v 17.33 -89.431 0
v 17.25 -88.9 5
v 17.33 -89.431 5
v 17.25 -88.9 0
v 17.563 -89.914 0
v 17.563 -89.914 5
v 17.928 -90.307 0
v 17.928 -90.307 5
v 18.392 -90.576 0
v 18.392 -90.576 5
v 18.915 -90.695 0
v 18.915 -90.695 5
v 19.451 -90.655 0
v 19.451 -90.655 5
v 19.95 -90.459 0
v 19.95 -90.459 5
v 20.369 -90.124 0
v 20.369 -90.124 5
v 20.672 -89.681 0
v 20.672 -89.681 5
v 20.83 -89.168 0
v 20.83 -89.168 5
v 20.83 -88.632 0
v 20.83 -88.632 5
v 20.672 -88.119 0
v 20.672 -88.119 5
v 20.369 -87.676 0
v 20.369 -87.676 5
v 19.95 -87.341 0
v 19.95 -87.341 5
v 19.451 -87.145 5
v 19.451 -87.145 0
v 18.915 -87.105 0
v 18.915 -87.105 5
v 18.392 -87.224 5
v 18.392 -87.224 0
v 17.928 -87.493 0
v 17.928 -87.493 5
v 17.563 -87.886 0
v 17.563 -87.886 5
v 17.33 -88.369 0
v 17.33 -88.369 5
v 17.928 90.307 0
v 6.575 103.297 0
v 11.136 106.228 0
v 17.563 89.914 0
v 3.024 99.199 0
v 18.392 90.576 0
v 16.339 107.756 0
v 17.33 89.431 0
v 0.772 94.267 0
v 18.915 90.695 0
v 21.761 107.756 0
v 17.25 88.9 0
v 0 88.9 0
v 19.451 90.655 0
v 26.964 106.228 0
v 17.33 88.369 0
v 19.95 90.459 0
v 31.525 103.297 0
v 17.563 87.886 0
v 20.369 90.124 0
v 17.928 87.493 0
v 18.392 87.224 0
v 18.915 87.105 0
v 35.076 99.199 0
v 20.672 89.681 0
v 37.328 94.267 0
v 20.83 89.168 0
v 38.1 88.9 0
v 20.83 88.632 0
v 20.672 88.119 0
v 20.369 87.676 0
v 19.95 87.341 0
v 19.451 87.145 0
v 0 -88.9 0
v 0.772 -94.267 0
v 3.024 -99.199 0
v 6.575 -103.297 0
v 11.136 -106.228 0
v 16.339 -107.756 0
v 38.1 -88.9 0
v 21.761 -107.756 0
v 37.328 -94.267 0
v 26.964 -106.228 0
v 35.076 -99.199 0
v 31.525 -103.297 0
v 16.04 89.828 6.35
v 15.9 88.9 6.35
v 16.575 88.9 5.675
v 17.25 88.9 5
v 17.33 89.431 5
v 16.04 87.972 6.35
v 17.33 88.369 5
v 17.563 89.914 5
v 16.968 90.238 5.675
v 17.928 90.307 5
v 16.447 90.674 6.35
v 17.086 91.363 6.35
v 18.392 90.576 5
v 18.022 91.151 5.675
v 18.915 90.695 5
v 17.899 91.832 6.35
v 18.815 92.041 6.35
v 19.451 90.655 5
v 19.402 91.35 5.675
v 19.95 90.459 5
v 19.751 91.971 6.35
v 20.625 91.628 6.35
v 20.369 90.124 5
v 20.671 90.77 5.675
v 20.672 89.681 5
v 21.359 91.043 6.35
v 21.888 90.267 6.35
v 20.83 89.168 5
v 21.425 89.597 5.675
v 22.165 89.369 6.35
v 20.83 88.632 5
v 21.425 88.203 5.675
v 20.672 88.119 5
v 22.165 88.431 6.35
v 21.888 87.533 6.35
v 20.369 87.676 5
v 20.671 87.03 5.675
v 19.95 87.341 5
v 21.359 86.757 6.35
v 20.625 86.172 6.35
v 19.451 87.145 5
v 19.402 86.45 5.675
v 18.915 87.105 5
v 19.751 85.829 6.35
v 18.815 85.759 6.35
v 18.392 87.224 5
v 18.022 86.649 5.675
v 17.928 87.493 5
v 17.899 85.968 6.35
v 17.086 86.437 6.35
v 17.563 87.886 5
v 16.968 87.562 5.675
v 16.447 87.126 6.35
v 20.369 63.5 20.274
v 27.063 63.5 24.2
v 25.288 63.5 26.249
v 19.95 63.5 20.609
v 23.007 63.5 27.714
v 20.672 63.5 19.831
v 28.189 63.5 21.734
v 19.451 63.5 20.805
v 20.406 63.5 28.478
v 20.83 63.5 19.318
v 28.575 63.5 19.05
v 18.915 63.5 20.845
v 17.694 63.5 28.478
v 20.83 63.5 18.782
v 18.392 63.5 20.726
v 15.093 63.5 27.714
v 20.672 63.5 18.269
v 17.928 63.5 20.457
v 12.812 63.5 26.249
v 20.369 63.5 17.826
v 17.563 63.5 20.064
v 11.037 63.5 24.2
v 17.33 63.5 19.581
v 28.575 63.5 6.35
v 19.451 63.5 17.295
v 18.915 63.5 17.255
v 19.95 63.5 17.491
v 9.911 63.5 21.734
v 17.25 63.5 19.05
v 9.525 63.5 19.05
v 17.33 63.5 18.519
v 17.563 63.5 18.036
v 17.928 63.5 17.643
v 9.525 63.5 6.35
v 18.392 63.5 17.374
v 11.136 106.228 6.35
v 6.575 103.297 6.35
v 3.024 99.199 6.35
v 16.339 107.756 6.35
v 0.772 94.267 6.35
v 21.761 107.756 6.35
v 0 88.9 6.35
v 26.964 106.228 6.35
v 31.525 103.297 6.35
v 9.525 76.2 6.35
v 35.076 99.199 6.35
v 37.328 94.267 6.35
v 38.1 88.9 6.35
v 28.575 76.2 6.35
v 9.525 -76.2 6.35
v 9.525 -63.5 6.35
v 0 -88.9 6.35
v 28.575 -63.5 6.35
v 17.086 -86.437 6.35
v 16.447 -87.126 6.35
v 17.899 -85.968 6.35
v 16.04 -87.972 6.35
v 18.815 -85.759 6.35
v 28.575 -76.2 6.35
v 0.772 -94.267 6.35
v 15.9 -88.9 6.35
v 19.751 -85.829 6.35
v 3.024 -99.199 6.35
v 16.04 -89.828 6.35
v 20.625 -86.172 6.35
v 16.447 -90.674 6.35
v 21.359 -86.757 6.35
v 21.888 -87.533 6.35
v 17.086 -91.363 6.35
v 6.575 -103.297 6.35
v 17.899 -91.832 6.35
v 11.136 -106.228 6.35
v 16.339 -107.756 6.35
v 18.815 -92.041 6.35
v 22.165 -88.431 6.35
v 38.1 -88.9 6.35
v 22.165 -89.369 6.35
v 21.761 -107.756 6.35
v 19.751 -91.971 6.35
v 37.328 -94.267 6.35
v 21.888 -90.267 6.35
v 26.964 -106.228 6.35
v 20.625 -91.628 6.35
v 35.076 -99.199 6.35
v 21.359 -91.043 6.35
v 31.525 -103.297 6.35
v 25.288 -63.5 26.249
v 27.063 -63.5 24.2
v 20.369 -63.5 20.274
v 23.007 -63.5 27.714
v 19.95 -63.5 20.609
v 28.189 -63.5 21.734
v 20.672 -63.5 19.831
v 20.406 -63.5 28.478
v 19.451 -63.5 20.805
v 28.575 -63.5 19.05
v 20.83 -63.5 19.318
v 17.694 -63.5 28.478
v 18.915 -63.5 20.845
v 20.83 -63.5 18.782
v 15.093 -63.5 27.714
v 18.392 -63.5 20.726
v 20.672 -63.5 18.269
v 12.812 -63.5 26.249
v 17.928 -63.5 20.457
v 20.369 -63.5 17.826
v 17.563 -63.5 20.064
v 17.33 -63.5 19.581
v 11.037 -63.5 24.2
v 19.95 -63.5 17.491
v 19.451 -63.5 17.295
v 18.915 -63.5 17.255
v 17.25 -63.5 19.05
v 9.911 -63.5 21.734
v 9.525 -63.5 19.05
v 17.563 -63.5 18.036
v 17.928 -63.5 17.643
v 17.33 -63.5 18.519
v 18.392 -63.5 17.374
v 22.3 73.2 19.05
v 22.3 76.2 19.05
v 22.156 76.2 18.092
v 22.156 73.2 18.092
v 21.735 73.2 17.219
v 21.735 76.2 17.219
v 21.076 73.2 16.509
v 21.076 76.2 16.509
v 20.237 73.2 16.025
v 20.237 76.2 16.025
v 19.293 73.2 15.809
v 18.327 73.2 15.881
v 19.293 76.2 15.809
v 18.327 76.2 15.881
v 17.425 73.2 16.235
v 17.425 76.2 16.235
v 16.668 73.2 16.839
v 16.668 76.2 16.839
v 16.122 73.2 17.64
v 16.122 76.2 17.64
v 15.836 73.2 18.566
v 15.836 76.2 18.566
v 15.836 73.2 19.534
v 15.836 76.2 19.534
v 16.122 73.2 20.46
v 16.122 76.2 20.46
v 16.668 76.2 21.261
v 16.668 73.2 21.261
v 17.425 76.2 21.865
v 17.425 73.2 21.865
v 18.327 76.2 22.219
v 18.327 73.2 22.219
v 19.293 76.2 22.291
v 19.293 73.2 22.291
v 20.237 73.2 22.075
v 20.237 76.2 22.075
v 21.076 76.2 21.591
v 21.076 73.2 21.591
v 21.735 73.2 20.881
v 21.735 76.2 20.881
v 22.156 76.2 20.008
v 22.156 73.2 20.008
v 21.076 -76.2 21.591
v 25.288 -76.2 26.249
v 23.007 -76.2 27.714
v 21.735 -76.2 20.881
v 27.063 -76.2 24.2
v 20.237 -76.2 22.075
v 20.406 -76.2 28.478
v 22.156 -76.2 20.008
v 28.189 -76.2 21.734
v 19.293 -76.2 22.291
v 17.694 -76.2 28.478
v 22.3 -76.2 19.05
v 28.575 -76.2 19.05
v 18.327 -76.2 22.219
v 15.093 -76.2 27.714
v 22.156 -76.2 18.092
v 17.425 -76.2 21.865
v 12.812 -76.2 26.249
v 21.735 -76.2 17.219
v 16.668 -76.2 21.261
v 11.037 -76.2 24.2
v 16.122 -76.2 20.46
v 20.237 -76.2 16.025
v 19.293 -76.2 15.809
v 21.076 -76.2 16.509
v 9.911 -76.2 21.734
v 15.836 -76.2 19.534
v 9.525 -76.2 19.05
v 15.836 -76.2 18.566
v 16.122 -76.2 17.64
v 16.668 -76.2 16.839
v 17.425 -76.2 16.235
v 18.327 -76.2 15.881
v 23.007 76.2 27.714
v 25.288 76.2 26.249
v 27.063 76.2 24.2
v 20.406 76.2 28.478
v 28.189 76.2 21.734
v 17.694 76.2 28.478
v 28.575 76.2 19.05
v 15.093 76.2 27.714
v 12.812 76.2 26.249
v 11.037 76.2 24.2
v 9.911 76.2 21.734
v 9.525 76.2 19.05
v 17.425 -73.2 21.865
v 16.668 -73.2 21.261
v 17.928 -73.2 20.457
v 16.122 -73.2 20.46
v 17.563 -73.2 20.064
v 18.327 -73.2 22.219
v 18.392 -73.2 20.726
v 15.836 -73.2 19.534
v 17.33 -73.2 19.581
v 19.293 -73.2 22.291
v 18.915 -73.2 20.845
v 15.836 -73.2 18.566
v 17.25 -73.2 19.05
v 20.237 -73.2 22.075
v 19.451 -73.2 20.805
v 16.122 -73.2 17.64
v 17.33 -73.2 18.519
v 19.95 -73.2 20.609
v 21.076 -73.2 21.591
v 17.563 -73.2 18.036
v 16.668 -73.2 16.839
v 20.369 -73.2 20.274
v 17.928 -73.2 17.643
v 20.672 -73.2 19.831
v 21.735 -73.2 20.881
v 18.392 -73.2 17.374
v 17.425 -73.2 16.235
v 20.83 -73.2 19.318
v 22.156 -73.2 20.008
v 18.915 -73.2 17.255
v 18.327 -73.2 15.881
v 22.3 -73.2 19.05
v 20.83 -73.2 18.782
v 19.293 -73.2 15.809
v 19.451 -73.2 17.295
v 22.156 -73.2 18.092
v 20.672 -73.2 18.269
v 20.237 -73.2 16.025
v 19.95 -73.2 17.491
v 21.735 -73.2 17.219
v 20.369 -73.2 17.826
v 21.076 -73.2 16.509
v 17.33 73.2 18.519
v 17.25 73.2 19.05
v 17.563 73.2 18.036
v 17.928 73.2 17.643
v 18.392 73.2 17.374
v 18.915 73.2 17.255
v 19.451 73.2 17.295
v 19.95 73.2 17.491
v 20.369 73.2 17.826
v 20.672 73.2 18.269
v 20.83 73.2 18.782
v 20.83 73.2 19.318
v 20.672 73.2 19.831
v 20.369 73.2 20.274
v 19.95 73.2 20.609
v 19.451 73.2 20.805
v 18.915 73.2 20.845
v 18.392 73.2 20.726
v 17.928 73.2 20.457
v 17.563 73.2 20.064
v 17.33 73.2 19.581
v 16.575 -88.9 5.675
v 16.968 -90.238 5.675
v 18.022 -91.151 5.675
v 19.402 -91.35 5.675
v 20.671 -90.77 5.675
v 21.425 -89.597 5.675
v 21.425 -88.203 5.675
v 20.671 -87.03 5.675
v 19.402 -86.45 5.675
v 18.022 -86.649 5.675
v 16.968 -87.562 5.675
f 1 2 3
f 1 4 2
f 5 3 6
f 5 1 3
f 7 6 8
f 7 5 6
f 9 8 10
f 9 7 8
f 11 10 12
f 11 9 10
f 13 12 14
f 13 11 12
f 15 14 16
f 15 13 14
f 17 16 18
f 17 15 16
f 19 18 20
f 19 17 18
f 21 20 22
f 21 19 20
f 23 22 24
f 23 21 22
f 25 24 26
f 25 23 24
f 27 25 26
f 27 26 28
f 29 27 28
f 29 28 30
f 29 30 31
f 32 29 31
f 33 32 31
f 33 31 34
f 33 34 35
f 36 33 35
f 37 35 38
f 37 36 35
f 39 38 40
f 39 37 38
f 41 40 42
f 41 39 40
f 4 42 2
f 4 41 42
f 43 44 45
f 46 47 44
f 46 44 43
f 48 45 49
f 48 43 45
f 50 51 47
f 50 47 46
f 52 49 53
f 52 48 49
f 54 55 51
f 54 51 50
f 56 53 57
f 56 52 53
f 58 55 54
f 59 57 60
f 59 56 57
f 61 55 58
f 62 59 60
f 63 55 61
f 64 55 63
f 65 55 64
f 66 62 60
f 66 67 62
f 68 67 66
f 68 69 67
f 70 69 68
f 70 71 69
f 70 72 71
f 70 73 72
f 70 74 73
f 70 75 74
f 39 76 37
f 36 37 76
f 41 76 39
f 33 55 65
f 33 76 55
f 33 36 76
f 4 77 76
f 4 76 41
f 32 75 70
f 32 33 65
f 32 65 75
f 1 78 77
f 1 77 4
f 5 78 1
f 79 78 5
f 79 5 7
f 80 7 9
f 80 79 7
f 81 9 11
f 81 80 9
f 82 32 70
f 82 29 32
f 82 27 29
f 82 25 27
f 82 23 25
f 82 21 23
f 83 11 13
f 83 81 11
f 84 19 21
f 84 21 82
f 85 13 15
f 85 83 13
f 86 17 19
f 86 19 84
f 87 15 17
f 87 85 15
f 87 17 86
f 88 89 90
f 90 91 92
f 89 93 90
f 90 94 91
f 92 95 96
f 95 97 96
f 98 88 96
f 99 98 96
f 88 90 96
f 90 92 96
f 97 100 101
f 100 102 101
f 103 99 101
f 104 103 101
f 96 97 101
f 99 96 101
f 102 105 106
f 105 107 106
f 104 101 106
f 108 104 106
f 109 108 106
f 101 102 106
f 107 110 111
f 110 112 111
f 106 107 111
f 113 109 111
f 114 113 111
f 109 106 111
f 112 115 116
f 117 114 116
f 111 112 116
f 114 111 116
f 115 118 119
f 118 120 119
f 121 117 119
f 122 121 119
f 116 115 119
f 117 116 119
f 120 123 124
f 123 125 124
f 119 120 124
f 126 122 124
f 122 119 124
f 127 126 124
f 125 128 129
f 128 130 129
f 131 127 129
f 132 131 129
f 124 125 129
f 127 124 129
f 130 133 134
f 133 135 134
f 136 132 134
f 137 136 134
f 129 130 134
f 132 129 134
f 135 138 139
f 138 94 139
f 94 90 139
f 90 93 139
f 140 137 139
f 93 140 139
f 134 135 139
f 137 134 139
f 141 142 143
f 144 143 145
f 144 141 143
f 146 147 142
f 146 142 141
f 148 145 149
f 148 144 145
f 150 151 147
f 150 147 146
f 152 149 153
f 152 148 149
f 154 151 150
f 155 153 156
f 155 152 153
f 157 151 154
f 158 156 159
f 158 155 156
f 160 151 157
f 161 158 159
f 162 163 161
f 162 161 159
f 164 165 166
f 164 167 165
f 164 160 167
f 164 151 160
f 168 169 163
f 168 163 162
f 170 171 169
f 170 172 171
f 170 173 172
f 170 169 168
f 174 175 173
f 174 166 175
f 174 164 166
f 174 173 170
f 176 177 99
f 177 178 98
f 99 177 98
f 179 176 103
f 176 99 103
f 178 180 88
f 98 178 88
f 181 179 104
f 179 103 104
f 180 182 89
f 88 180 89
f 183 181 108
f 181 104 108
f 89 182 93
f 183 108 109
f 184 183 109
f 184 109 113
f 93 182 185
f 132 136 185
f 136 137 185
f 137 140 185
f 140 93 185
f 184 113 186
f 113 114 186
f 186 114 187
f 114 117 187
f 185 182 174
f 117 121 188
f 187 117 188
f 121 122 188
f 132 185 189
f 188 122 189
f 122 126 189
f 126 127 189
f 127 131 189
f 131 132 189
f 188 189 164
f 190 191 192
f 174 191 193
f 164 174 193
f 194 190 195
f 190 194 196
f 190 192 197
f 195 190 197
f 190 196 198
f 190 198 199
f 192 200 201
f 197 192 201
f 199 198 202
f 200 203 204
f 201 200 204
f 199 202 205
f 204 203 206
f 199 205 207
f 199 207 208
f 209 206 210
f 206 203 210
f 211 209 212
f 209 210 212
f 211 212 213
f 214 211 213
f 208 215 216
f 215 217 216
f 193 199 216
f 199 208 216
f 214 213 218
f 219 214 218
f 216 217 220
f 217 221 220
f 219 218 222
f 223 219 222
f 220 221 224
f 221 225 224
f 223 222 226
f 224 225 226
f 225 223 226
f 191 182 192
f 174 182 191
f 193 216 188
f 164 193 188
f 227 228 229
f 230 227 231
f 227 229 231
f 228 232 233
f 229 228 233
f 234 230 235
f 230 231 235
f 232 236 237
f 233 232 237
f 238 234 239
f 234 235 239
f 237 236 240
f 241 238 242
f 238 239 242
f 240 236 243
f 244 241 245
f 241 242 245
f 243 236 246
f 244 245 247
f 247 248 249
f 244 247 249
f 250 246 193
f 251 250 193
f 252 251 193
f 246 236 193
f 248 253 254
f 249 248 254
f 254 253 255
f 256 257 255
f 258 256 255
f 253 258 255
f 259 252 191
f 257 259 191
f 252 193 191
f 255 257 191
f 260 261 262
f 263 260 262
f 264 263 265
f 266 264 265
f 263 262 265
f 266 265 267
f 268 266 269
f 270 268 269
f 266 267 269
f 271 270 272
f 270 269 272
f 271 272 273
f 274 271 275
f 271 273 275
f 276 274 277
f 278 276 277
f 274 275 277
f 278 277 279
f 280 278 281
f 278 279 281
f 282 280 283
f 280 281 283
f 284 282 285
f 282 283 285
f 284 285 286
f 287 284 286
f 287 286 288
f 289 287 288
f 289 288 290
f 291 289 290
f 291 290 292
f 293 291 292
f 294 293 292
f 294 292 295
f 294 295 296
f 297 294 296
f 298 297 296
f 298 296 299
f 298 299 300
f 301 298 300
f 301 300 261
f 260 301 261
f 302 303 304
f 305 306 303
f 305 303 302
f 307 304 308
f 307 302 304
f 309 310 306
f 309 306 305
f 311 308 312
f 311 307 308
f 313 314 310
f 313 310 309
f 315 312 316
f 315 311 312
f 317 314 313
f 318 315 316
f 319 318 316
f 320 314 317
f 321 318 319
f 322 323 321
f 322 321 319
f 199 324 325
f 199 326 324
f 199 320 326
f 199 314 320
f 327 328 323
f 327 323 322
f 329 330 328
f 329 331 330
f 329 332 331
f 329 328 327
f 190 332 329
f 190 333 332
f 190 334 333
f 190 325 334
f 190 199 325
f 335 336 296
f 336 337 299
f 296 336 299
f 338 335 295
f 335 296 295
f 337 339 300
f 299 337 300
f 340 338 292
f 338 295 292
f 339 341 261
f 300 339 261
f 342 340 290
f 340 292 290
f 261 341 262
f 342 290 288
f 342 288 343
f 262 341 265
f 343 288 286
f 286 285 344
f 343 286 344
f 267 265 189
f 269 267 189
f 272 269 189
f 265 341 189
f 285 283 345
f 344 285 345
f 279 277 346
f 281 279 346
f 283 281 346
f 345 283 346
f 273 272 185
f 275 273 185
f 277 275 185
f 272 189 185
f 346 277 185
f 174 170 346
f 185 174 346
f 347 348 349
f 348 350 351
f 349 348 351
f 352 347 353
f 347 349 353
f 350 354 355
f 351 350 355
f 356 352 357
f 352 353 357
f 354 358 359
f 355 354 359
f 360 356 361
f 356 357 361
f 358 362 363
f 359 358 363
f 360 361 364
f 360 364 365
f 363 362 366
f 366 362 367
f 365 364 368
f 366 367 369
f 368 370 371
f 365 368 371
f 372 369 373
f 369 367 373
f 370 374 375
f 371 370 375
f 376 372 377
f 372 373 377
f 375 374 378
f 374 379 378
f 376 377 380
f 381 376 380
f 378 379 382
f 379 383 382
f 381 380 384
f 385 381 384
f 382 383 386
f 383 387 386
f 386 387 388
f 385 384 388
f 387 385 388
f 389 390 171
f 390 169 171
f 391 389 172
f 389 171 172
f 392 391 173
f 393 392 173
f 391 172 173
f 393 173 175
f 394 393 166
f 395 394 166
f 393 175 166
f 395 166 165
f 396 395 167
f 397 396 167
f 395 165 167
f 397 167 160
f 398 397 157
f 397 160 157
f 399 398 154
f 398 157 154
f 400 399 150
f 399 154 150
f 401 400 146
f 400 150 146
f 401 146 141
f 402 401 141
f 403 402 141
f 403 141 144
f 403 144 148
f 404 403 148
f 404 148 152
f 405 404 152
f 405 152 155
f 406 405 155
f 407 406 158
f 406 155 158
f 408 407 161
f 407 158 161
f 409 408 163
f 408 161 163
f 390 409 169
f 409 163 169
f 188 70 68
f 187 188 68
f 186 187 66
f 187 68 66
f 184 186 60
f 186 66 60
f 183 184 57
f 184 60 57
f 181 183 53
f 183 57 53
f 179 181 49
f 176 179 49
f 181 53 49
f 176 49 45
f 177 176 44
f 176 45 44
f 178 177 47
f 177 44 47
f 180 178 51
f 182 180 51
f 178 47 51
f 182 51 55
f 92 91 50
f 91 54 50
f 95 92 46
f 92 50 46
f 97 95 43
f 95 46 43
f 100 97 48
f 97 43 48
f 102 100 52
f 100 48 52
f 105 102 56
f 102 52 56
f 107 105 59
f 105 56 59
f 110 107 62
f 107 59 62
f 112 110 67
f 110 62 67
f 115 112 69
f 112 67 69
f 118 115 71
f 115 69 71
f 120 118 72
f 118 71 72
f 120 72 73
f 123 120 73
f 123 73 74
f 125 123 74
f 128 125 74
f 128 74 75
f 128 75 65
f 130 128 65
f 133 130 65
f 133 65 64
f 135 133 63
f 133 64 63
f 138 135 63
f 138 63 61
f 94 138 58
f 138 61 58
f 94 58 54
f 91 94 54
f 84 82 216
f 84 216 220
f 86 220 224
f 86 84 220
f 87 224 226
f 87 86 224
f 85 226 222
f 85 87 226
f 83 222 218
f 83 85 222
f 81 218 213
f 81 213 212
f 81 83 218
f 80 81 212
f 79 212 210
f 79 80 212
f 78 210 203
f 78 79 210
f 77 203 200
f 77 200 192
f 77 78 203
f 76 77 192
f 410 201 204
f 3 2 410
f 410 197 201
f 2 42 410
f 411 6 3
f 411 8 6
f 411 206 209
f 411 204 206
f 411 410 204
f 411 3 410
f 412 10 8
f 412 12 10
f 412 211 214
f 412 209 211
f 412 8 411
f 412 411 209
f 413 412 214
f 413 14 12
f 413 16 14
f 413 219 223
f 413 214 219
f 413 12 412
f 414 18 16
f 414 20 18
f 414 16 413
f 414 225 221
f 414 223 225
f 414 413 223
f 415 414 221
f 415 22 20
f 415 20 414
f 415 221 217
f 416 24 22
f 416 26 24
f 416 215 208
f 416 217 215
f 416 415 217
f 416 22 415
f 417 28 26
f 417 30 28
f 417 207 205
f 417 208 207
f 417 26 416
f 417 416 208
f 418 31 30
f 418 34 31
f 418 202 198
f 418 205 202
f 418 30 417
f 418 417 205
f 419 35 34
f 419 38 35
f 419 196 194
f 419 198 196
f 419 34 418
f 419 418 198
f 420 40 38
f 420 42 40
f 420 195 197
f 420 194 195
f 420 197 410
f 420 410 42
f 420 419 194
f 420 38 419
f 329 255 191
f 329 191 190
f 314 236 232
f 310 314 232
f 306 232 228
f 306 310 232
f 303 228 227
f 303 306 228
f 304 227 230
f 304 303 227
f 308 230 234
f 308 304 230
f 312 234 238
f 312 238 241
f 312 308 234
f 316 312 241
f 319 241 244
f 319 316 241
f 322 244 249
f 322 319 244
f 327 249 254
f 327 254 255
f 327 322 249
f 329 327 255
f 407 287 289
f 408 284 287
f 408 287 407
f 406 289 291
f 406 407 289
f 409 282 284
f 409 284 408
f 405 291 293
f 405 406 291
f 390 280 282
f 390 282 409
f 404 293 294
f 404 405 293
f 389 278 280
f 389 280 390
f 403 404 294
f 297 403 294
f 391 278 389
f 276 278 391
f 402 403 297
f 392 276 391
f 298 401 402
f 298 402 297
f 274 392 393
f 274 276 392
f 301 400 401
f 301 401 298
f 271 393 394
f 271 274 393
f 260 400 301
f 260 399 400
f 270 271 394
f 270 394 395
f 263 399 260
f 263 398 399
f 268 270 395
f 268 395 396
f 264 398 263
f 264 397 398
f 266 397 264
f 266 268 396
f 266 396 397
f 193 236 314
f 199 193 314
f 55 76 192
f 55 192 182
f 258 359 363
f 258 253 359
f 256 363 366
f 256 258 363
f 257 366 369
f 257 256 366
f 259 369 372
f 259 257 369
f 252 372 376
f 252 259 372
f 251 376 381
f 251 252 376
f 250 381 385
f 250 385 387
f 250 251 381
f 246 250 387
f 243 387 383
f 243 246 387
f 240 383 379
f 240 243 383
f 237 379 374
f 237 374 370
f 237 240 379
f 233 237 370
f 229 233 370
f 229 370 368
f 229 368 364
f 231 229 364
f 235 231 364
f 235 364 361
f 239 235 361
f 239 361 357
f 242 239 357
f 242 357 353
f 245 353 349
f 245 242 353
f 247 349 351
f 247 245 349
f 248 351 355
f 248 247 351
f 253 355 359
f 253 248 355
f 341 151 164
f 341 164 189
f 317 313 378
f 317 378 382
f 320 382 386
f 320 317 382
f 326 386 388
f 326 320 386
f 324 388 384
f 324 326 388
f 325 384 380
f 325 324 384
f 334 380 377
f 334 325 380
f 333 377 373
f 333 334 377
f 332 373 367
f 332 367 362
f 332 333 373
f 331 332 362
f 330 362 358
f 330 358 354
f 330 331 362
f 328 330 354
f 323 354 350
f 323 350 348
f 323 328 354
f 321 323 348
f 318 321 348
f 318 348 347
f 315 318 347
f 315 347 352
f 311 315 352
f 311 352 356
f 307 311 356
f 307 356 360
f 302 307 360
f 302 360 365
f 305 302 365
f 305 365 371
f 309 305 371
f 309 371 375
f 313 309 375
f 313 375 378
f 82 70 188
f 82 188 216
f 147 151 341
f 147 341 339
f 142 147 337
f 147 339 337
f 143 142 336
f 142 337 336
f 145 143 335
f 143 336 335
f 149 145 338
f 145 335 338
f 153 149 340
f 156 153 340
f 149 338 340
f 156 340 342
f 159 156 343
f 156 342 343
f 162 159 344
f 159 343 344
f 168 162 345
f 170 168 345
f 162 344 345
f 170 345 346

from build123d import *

# Parameters (mm, degrees)
BOSS_EXTRUDE1_DEPTH                             = 6.35
CSK_FOR_M3_FLAT_HEAD_MACHINE_SCREW1_D           = 3.6
CSK_FOR_M3_FLAT_HEAD_MACHINE_SCREW1_CSINK_D     = 6.3
CSK_FOR_M3_FLAT_HEAD_MACHINE_SCREW1_CSINK_ANGLE = 90
SKETCH3_W                                       = 19.05
SKETCH3_H                                       = 12.7
BOSS_EXTRUDE2_DEPTH                             = 12.7
BOSS_EXTRUDE5_DEPTH                             = 12.7
CBORE_FOR_M3_SHCS1_D                            = 3.6
CBORE_FOR_M3_SHCS1_CBORE_D                      = 6.5
CBORE_FOR_M3_SHCS1_CBORE_DEPTH                  = 3


with BuildPart() as part:
    # Sketch1 → Boss-Extrude1 (new body)
    with BuildSketch(Plane.XY):
        with BuildLine():
            Line((0, 0), (38.1, 0))
            Line((38.1, 0), (38.1, 88.9))
            ThreePointArc((38.1, 88.9), (19.05, 107.95), (0, 88.9))
            Line((0, 88.9), (0, 0))
        make_face()
    boss_extrude1 = extrude(amount=BOSS_EXTRUDE1_DEPTH)

    # CSK for M3 Flat Head Machine Screw1 (through all)
    with Locations(Plane(origin=(19.05, 88.9, 6.35), x_dir=(1, 0, 0), z_dir=(0, 0, 1))):
        with Locations((0, 0)):
            csk_for_m3_flat_head_machine_screw1 = CounterSinkHole(CSK_FOR_M3_FLAT_HEAD_MACHINE_SCREW1_D / 2, CSK_FOR_M3_FLAT_HEAD_MACHINE_SCREW1_CSINK_D / 2, counter_sink_angle=CSK_FOR_M3_FLAT_HEAD_MACHINE_SCREW1_CSINK_ANGLE)

    # Sketch3 → Boss-Extrude2 (add)
    with BuildSketch(Plane.XY.offset(6.35)):
        with Locations((19.05, 69.85)):
            Rectangle(SKETCH3_W, SKETCH3_H)
    boss_extrude2 = extrude(amount=BOSS_EXTRUDE2_DEPTH)

    # Sketch6 → Boss-Extrude5 (add)
    with BuildSketch(Plane(origin=(0, 76.2, 0), x_dir=(1, 0, 0), z_dir=(0, 1, 0))):
        with BuildLine():
            Line((9.525, -19.05), (28.575, -19.05))
            ThreePointArc((28.575, -19.05), (19.05, -28.575), (9.525, -19.05))
        make_face()
    boss_extrude5 = extrude(amount=-BOSS_EXTRUDE5_DEPTH)

    # CBORE for M3 SHCS1 (through all)
    with Locations(Plane(origin=(0, 76.2, 0), x_dir=(1, 0, 0), z_dir=(0, 1, 0))):
        with Locations((19.05, -19.05)):
            cbore_for_m3_shcs1 = CounterBoreHole(CBORE_FOR_M3_SHCS1_D / 2, CBORE_FOR_M3_SHCS1_CBORE_D / 2, CBORE_FOR_M3_SHCS1_CBORE_DEPTH)

    # Mirror1: Boss-Extrude1, CSK for M3 Flat Head Machine Screw1, Boss-Extrude2, Boss-Extrude5, CBORE for M3 SHCS1 across plane
    add(boss_extrude1.mirror(Plane.ZX))
    add(csk_for_m3_flat_head_machine_screw1.mirror(Plane.ZX), mode=Mode.SUBTRACT)
    add(boss_extrude2.mirror(Plane.ZX))
    add(boss_extrude5.mirror(Plane.ZX))
    add(cbore_for_m3_shcs1.mirror(Plane.ZX), mode=Mode.SUBTRACT)


solid = part.part
